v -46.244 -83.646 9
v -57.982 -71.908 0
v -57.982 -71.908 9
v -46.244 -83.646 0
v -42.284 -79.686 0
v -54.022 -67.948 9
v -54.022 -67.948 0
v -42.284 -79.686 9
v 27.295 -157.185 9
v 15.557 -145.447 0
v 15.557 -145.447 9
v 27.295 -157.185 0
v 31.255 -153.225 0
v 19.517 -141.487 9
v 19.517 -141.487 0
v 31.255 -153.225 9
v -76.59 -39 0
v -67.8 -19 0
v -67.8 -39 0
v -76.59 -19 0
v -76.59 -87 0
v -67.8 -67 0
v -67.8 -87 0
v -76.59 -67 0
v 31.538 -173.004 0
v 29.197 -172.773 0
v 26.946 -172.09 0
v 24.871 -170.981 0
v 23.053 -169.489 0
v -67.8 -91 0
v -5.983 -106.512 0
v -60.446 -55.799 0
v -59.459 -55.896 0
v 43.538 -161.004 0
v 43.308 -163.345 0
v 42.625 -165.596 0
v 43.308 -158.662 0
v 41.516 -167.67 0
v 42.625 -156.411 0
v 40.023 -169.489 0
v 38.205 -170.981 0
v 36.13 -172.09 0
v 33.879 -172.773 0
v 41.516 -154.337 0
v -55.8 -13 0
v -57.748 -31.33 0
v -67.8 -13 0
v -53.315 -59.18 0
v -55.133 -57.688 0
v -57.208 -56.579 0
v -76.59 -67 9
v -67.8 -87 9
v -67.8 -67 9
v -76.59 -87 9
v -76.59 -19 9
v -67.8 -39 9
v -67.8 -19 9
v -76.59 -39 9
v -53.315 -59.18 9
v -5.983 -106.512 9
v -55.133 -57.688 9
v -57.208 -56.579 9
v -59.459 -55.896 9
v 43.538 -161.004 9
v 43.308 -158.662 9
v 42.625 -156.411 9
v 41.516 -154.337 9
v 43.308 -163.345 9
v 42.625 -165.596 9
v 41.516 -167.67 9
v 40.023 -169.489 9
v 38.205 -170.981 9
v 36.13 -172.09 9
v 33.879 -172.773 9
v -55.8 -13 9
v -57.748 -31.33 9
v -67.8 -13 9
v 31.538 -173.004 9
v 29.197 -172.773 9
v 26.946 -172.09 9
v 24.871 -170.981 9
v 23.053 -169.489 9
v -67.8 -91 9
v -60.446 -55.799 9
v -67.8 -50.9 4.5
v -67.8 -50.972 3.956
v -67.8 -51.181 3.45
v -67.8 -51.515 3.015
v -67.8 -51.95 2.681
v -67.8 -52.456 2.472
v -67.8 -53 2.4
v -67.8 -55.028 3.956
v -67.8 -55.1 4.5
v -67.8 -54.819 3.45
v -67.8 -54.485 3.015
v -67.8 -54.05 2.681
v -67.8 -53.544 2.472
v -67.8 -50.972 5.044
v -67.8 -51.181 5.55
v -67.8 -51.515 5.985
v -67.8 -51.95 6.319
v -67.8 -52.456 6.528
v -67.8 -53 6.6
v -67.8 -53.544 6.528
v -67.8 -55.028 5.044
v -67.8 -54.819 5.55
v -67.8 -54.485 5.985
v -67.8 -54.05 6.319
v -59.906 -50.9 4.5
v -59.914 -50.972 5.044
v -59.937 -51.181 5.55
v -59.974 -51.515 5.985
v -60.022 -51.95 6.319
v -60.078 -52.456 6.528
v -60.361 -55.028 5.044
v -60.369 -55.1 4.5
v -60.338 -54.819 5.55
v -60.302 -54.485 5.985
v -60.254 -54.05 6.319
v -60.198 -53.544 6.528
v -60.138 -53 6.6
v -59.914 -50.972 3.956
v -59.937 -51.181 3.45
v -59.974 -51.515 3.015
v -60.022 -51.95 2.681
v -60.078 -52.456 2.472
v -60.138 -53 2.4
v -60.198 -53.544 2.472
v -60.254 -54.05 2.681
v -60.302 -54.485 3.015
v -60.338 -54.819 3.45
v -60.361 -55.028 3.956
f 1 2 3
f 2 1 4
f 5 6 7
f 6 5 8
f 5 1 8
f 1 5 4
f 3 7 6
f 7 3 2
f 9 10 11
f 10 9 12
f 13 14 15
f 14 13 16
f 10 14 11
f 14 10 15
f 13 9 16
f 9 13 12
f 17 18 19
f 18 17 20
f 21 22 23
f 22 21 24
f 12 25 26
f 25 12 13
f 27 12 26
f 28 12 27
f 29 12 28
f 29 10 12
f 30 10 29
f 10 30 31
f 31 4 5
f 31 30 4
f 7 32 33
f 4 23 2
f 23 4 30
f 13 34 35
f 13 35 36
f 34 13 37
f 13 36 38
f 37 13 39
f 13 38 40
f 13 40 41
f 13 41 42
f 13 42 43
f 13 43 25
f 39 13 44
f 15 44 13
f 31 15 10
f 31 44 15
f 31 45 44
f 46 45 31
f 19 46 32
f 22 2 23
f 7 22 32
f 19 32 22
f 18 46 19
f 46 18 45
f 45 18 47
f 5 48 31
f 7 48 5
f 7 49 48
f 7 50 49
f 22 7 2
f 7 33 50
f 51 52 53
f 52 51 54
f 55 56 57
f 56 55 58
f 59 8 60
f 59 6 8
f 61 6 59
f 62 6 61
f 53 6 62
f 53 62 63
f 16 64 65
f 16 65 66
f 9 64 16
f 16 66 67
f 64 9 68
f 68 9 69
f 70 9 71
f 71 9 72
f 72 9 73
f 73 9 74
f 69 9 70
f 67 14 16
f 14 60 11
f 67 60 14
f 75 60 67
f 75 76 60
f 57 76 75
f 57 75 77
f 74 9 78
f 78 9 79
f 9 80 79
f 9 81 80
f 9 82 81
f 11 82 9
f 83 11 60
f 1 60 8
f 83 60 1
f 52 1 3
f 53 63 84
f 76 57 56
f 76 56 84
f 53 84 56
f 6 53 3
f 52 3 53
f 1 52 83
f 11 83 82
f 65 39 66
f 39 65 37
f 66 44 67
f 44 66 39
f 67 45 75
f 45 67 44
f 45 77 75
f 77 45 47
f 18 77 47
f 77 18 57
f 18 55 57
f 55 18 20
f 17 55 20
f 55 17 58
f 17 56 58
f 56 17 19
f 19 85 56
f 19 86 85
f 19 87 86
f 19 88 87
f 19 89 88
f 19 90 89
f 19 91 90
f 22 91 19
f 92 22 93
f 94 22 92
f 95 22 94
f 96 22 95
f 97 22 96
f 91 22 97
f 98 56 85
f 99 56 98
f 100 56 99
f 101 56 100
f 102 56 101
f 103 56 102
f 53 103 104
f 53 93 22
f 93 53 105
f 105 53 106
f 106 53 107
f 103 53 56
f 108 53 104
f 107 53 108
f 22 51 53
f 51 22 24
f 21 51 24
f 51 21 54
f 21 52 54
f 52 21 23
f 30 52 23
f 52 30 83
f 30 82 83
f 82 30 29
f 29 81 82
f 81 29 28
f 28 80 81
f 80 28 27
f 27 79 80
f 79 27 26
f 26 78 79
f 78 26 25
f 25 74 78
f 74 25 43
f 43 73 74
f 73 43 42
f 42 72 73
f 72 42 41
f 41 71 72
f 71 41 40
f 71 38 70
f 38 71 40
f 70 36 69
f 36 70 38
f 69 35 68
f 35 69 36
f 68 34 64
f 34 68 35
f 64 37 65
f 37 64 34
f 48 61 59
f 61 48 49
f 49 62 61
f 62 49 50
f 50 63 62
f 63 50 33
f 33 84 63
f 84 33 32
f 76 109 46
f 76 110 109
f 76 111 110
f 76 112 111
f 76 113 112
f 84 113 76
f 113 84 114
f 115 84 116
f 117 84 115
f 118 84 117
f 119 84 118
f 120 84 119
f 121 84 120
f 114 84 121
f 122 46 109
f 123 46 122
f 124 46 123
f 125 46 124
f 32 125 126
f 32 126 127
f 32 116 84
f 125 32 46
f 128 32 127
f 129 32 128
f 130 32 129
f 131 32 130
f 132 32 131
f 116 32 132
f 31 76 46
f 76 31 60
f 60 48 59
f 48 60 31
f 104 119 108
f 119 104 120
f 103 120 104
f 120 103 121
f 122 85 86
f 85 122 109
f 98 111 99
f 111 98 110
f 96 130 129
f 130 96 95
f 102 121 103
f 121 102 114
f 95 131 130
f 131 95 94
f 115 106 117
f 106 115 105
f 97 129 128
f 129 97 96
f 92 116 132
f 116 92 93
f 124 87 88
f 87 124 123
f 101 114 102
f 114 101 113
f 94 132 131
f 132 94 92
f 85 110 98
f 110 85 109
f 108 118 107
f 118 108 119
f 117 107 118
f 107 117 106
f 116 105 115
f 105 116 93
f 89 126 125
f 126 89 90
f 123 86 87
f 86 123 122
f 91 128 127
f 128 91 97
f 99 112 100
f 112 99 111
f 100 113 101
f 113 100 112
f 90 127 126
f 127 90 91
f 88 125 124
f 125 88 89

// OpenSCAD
include <../lib/meshtastic-drybag-node-lib.scad>;
$fn = 40;
panel_rib_print();
